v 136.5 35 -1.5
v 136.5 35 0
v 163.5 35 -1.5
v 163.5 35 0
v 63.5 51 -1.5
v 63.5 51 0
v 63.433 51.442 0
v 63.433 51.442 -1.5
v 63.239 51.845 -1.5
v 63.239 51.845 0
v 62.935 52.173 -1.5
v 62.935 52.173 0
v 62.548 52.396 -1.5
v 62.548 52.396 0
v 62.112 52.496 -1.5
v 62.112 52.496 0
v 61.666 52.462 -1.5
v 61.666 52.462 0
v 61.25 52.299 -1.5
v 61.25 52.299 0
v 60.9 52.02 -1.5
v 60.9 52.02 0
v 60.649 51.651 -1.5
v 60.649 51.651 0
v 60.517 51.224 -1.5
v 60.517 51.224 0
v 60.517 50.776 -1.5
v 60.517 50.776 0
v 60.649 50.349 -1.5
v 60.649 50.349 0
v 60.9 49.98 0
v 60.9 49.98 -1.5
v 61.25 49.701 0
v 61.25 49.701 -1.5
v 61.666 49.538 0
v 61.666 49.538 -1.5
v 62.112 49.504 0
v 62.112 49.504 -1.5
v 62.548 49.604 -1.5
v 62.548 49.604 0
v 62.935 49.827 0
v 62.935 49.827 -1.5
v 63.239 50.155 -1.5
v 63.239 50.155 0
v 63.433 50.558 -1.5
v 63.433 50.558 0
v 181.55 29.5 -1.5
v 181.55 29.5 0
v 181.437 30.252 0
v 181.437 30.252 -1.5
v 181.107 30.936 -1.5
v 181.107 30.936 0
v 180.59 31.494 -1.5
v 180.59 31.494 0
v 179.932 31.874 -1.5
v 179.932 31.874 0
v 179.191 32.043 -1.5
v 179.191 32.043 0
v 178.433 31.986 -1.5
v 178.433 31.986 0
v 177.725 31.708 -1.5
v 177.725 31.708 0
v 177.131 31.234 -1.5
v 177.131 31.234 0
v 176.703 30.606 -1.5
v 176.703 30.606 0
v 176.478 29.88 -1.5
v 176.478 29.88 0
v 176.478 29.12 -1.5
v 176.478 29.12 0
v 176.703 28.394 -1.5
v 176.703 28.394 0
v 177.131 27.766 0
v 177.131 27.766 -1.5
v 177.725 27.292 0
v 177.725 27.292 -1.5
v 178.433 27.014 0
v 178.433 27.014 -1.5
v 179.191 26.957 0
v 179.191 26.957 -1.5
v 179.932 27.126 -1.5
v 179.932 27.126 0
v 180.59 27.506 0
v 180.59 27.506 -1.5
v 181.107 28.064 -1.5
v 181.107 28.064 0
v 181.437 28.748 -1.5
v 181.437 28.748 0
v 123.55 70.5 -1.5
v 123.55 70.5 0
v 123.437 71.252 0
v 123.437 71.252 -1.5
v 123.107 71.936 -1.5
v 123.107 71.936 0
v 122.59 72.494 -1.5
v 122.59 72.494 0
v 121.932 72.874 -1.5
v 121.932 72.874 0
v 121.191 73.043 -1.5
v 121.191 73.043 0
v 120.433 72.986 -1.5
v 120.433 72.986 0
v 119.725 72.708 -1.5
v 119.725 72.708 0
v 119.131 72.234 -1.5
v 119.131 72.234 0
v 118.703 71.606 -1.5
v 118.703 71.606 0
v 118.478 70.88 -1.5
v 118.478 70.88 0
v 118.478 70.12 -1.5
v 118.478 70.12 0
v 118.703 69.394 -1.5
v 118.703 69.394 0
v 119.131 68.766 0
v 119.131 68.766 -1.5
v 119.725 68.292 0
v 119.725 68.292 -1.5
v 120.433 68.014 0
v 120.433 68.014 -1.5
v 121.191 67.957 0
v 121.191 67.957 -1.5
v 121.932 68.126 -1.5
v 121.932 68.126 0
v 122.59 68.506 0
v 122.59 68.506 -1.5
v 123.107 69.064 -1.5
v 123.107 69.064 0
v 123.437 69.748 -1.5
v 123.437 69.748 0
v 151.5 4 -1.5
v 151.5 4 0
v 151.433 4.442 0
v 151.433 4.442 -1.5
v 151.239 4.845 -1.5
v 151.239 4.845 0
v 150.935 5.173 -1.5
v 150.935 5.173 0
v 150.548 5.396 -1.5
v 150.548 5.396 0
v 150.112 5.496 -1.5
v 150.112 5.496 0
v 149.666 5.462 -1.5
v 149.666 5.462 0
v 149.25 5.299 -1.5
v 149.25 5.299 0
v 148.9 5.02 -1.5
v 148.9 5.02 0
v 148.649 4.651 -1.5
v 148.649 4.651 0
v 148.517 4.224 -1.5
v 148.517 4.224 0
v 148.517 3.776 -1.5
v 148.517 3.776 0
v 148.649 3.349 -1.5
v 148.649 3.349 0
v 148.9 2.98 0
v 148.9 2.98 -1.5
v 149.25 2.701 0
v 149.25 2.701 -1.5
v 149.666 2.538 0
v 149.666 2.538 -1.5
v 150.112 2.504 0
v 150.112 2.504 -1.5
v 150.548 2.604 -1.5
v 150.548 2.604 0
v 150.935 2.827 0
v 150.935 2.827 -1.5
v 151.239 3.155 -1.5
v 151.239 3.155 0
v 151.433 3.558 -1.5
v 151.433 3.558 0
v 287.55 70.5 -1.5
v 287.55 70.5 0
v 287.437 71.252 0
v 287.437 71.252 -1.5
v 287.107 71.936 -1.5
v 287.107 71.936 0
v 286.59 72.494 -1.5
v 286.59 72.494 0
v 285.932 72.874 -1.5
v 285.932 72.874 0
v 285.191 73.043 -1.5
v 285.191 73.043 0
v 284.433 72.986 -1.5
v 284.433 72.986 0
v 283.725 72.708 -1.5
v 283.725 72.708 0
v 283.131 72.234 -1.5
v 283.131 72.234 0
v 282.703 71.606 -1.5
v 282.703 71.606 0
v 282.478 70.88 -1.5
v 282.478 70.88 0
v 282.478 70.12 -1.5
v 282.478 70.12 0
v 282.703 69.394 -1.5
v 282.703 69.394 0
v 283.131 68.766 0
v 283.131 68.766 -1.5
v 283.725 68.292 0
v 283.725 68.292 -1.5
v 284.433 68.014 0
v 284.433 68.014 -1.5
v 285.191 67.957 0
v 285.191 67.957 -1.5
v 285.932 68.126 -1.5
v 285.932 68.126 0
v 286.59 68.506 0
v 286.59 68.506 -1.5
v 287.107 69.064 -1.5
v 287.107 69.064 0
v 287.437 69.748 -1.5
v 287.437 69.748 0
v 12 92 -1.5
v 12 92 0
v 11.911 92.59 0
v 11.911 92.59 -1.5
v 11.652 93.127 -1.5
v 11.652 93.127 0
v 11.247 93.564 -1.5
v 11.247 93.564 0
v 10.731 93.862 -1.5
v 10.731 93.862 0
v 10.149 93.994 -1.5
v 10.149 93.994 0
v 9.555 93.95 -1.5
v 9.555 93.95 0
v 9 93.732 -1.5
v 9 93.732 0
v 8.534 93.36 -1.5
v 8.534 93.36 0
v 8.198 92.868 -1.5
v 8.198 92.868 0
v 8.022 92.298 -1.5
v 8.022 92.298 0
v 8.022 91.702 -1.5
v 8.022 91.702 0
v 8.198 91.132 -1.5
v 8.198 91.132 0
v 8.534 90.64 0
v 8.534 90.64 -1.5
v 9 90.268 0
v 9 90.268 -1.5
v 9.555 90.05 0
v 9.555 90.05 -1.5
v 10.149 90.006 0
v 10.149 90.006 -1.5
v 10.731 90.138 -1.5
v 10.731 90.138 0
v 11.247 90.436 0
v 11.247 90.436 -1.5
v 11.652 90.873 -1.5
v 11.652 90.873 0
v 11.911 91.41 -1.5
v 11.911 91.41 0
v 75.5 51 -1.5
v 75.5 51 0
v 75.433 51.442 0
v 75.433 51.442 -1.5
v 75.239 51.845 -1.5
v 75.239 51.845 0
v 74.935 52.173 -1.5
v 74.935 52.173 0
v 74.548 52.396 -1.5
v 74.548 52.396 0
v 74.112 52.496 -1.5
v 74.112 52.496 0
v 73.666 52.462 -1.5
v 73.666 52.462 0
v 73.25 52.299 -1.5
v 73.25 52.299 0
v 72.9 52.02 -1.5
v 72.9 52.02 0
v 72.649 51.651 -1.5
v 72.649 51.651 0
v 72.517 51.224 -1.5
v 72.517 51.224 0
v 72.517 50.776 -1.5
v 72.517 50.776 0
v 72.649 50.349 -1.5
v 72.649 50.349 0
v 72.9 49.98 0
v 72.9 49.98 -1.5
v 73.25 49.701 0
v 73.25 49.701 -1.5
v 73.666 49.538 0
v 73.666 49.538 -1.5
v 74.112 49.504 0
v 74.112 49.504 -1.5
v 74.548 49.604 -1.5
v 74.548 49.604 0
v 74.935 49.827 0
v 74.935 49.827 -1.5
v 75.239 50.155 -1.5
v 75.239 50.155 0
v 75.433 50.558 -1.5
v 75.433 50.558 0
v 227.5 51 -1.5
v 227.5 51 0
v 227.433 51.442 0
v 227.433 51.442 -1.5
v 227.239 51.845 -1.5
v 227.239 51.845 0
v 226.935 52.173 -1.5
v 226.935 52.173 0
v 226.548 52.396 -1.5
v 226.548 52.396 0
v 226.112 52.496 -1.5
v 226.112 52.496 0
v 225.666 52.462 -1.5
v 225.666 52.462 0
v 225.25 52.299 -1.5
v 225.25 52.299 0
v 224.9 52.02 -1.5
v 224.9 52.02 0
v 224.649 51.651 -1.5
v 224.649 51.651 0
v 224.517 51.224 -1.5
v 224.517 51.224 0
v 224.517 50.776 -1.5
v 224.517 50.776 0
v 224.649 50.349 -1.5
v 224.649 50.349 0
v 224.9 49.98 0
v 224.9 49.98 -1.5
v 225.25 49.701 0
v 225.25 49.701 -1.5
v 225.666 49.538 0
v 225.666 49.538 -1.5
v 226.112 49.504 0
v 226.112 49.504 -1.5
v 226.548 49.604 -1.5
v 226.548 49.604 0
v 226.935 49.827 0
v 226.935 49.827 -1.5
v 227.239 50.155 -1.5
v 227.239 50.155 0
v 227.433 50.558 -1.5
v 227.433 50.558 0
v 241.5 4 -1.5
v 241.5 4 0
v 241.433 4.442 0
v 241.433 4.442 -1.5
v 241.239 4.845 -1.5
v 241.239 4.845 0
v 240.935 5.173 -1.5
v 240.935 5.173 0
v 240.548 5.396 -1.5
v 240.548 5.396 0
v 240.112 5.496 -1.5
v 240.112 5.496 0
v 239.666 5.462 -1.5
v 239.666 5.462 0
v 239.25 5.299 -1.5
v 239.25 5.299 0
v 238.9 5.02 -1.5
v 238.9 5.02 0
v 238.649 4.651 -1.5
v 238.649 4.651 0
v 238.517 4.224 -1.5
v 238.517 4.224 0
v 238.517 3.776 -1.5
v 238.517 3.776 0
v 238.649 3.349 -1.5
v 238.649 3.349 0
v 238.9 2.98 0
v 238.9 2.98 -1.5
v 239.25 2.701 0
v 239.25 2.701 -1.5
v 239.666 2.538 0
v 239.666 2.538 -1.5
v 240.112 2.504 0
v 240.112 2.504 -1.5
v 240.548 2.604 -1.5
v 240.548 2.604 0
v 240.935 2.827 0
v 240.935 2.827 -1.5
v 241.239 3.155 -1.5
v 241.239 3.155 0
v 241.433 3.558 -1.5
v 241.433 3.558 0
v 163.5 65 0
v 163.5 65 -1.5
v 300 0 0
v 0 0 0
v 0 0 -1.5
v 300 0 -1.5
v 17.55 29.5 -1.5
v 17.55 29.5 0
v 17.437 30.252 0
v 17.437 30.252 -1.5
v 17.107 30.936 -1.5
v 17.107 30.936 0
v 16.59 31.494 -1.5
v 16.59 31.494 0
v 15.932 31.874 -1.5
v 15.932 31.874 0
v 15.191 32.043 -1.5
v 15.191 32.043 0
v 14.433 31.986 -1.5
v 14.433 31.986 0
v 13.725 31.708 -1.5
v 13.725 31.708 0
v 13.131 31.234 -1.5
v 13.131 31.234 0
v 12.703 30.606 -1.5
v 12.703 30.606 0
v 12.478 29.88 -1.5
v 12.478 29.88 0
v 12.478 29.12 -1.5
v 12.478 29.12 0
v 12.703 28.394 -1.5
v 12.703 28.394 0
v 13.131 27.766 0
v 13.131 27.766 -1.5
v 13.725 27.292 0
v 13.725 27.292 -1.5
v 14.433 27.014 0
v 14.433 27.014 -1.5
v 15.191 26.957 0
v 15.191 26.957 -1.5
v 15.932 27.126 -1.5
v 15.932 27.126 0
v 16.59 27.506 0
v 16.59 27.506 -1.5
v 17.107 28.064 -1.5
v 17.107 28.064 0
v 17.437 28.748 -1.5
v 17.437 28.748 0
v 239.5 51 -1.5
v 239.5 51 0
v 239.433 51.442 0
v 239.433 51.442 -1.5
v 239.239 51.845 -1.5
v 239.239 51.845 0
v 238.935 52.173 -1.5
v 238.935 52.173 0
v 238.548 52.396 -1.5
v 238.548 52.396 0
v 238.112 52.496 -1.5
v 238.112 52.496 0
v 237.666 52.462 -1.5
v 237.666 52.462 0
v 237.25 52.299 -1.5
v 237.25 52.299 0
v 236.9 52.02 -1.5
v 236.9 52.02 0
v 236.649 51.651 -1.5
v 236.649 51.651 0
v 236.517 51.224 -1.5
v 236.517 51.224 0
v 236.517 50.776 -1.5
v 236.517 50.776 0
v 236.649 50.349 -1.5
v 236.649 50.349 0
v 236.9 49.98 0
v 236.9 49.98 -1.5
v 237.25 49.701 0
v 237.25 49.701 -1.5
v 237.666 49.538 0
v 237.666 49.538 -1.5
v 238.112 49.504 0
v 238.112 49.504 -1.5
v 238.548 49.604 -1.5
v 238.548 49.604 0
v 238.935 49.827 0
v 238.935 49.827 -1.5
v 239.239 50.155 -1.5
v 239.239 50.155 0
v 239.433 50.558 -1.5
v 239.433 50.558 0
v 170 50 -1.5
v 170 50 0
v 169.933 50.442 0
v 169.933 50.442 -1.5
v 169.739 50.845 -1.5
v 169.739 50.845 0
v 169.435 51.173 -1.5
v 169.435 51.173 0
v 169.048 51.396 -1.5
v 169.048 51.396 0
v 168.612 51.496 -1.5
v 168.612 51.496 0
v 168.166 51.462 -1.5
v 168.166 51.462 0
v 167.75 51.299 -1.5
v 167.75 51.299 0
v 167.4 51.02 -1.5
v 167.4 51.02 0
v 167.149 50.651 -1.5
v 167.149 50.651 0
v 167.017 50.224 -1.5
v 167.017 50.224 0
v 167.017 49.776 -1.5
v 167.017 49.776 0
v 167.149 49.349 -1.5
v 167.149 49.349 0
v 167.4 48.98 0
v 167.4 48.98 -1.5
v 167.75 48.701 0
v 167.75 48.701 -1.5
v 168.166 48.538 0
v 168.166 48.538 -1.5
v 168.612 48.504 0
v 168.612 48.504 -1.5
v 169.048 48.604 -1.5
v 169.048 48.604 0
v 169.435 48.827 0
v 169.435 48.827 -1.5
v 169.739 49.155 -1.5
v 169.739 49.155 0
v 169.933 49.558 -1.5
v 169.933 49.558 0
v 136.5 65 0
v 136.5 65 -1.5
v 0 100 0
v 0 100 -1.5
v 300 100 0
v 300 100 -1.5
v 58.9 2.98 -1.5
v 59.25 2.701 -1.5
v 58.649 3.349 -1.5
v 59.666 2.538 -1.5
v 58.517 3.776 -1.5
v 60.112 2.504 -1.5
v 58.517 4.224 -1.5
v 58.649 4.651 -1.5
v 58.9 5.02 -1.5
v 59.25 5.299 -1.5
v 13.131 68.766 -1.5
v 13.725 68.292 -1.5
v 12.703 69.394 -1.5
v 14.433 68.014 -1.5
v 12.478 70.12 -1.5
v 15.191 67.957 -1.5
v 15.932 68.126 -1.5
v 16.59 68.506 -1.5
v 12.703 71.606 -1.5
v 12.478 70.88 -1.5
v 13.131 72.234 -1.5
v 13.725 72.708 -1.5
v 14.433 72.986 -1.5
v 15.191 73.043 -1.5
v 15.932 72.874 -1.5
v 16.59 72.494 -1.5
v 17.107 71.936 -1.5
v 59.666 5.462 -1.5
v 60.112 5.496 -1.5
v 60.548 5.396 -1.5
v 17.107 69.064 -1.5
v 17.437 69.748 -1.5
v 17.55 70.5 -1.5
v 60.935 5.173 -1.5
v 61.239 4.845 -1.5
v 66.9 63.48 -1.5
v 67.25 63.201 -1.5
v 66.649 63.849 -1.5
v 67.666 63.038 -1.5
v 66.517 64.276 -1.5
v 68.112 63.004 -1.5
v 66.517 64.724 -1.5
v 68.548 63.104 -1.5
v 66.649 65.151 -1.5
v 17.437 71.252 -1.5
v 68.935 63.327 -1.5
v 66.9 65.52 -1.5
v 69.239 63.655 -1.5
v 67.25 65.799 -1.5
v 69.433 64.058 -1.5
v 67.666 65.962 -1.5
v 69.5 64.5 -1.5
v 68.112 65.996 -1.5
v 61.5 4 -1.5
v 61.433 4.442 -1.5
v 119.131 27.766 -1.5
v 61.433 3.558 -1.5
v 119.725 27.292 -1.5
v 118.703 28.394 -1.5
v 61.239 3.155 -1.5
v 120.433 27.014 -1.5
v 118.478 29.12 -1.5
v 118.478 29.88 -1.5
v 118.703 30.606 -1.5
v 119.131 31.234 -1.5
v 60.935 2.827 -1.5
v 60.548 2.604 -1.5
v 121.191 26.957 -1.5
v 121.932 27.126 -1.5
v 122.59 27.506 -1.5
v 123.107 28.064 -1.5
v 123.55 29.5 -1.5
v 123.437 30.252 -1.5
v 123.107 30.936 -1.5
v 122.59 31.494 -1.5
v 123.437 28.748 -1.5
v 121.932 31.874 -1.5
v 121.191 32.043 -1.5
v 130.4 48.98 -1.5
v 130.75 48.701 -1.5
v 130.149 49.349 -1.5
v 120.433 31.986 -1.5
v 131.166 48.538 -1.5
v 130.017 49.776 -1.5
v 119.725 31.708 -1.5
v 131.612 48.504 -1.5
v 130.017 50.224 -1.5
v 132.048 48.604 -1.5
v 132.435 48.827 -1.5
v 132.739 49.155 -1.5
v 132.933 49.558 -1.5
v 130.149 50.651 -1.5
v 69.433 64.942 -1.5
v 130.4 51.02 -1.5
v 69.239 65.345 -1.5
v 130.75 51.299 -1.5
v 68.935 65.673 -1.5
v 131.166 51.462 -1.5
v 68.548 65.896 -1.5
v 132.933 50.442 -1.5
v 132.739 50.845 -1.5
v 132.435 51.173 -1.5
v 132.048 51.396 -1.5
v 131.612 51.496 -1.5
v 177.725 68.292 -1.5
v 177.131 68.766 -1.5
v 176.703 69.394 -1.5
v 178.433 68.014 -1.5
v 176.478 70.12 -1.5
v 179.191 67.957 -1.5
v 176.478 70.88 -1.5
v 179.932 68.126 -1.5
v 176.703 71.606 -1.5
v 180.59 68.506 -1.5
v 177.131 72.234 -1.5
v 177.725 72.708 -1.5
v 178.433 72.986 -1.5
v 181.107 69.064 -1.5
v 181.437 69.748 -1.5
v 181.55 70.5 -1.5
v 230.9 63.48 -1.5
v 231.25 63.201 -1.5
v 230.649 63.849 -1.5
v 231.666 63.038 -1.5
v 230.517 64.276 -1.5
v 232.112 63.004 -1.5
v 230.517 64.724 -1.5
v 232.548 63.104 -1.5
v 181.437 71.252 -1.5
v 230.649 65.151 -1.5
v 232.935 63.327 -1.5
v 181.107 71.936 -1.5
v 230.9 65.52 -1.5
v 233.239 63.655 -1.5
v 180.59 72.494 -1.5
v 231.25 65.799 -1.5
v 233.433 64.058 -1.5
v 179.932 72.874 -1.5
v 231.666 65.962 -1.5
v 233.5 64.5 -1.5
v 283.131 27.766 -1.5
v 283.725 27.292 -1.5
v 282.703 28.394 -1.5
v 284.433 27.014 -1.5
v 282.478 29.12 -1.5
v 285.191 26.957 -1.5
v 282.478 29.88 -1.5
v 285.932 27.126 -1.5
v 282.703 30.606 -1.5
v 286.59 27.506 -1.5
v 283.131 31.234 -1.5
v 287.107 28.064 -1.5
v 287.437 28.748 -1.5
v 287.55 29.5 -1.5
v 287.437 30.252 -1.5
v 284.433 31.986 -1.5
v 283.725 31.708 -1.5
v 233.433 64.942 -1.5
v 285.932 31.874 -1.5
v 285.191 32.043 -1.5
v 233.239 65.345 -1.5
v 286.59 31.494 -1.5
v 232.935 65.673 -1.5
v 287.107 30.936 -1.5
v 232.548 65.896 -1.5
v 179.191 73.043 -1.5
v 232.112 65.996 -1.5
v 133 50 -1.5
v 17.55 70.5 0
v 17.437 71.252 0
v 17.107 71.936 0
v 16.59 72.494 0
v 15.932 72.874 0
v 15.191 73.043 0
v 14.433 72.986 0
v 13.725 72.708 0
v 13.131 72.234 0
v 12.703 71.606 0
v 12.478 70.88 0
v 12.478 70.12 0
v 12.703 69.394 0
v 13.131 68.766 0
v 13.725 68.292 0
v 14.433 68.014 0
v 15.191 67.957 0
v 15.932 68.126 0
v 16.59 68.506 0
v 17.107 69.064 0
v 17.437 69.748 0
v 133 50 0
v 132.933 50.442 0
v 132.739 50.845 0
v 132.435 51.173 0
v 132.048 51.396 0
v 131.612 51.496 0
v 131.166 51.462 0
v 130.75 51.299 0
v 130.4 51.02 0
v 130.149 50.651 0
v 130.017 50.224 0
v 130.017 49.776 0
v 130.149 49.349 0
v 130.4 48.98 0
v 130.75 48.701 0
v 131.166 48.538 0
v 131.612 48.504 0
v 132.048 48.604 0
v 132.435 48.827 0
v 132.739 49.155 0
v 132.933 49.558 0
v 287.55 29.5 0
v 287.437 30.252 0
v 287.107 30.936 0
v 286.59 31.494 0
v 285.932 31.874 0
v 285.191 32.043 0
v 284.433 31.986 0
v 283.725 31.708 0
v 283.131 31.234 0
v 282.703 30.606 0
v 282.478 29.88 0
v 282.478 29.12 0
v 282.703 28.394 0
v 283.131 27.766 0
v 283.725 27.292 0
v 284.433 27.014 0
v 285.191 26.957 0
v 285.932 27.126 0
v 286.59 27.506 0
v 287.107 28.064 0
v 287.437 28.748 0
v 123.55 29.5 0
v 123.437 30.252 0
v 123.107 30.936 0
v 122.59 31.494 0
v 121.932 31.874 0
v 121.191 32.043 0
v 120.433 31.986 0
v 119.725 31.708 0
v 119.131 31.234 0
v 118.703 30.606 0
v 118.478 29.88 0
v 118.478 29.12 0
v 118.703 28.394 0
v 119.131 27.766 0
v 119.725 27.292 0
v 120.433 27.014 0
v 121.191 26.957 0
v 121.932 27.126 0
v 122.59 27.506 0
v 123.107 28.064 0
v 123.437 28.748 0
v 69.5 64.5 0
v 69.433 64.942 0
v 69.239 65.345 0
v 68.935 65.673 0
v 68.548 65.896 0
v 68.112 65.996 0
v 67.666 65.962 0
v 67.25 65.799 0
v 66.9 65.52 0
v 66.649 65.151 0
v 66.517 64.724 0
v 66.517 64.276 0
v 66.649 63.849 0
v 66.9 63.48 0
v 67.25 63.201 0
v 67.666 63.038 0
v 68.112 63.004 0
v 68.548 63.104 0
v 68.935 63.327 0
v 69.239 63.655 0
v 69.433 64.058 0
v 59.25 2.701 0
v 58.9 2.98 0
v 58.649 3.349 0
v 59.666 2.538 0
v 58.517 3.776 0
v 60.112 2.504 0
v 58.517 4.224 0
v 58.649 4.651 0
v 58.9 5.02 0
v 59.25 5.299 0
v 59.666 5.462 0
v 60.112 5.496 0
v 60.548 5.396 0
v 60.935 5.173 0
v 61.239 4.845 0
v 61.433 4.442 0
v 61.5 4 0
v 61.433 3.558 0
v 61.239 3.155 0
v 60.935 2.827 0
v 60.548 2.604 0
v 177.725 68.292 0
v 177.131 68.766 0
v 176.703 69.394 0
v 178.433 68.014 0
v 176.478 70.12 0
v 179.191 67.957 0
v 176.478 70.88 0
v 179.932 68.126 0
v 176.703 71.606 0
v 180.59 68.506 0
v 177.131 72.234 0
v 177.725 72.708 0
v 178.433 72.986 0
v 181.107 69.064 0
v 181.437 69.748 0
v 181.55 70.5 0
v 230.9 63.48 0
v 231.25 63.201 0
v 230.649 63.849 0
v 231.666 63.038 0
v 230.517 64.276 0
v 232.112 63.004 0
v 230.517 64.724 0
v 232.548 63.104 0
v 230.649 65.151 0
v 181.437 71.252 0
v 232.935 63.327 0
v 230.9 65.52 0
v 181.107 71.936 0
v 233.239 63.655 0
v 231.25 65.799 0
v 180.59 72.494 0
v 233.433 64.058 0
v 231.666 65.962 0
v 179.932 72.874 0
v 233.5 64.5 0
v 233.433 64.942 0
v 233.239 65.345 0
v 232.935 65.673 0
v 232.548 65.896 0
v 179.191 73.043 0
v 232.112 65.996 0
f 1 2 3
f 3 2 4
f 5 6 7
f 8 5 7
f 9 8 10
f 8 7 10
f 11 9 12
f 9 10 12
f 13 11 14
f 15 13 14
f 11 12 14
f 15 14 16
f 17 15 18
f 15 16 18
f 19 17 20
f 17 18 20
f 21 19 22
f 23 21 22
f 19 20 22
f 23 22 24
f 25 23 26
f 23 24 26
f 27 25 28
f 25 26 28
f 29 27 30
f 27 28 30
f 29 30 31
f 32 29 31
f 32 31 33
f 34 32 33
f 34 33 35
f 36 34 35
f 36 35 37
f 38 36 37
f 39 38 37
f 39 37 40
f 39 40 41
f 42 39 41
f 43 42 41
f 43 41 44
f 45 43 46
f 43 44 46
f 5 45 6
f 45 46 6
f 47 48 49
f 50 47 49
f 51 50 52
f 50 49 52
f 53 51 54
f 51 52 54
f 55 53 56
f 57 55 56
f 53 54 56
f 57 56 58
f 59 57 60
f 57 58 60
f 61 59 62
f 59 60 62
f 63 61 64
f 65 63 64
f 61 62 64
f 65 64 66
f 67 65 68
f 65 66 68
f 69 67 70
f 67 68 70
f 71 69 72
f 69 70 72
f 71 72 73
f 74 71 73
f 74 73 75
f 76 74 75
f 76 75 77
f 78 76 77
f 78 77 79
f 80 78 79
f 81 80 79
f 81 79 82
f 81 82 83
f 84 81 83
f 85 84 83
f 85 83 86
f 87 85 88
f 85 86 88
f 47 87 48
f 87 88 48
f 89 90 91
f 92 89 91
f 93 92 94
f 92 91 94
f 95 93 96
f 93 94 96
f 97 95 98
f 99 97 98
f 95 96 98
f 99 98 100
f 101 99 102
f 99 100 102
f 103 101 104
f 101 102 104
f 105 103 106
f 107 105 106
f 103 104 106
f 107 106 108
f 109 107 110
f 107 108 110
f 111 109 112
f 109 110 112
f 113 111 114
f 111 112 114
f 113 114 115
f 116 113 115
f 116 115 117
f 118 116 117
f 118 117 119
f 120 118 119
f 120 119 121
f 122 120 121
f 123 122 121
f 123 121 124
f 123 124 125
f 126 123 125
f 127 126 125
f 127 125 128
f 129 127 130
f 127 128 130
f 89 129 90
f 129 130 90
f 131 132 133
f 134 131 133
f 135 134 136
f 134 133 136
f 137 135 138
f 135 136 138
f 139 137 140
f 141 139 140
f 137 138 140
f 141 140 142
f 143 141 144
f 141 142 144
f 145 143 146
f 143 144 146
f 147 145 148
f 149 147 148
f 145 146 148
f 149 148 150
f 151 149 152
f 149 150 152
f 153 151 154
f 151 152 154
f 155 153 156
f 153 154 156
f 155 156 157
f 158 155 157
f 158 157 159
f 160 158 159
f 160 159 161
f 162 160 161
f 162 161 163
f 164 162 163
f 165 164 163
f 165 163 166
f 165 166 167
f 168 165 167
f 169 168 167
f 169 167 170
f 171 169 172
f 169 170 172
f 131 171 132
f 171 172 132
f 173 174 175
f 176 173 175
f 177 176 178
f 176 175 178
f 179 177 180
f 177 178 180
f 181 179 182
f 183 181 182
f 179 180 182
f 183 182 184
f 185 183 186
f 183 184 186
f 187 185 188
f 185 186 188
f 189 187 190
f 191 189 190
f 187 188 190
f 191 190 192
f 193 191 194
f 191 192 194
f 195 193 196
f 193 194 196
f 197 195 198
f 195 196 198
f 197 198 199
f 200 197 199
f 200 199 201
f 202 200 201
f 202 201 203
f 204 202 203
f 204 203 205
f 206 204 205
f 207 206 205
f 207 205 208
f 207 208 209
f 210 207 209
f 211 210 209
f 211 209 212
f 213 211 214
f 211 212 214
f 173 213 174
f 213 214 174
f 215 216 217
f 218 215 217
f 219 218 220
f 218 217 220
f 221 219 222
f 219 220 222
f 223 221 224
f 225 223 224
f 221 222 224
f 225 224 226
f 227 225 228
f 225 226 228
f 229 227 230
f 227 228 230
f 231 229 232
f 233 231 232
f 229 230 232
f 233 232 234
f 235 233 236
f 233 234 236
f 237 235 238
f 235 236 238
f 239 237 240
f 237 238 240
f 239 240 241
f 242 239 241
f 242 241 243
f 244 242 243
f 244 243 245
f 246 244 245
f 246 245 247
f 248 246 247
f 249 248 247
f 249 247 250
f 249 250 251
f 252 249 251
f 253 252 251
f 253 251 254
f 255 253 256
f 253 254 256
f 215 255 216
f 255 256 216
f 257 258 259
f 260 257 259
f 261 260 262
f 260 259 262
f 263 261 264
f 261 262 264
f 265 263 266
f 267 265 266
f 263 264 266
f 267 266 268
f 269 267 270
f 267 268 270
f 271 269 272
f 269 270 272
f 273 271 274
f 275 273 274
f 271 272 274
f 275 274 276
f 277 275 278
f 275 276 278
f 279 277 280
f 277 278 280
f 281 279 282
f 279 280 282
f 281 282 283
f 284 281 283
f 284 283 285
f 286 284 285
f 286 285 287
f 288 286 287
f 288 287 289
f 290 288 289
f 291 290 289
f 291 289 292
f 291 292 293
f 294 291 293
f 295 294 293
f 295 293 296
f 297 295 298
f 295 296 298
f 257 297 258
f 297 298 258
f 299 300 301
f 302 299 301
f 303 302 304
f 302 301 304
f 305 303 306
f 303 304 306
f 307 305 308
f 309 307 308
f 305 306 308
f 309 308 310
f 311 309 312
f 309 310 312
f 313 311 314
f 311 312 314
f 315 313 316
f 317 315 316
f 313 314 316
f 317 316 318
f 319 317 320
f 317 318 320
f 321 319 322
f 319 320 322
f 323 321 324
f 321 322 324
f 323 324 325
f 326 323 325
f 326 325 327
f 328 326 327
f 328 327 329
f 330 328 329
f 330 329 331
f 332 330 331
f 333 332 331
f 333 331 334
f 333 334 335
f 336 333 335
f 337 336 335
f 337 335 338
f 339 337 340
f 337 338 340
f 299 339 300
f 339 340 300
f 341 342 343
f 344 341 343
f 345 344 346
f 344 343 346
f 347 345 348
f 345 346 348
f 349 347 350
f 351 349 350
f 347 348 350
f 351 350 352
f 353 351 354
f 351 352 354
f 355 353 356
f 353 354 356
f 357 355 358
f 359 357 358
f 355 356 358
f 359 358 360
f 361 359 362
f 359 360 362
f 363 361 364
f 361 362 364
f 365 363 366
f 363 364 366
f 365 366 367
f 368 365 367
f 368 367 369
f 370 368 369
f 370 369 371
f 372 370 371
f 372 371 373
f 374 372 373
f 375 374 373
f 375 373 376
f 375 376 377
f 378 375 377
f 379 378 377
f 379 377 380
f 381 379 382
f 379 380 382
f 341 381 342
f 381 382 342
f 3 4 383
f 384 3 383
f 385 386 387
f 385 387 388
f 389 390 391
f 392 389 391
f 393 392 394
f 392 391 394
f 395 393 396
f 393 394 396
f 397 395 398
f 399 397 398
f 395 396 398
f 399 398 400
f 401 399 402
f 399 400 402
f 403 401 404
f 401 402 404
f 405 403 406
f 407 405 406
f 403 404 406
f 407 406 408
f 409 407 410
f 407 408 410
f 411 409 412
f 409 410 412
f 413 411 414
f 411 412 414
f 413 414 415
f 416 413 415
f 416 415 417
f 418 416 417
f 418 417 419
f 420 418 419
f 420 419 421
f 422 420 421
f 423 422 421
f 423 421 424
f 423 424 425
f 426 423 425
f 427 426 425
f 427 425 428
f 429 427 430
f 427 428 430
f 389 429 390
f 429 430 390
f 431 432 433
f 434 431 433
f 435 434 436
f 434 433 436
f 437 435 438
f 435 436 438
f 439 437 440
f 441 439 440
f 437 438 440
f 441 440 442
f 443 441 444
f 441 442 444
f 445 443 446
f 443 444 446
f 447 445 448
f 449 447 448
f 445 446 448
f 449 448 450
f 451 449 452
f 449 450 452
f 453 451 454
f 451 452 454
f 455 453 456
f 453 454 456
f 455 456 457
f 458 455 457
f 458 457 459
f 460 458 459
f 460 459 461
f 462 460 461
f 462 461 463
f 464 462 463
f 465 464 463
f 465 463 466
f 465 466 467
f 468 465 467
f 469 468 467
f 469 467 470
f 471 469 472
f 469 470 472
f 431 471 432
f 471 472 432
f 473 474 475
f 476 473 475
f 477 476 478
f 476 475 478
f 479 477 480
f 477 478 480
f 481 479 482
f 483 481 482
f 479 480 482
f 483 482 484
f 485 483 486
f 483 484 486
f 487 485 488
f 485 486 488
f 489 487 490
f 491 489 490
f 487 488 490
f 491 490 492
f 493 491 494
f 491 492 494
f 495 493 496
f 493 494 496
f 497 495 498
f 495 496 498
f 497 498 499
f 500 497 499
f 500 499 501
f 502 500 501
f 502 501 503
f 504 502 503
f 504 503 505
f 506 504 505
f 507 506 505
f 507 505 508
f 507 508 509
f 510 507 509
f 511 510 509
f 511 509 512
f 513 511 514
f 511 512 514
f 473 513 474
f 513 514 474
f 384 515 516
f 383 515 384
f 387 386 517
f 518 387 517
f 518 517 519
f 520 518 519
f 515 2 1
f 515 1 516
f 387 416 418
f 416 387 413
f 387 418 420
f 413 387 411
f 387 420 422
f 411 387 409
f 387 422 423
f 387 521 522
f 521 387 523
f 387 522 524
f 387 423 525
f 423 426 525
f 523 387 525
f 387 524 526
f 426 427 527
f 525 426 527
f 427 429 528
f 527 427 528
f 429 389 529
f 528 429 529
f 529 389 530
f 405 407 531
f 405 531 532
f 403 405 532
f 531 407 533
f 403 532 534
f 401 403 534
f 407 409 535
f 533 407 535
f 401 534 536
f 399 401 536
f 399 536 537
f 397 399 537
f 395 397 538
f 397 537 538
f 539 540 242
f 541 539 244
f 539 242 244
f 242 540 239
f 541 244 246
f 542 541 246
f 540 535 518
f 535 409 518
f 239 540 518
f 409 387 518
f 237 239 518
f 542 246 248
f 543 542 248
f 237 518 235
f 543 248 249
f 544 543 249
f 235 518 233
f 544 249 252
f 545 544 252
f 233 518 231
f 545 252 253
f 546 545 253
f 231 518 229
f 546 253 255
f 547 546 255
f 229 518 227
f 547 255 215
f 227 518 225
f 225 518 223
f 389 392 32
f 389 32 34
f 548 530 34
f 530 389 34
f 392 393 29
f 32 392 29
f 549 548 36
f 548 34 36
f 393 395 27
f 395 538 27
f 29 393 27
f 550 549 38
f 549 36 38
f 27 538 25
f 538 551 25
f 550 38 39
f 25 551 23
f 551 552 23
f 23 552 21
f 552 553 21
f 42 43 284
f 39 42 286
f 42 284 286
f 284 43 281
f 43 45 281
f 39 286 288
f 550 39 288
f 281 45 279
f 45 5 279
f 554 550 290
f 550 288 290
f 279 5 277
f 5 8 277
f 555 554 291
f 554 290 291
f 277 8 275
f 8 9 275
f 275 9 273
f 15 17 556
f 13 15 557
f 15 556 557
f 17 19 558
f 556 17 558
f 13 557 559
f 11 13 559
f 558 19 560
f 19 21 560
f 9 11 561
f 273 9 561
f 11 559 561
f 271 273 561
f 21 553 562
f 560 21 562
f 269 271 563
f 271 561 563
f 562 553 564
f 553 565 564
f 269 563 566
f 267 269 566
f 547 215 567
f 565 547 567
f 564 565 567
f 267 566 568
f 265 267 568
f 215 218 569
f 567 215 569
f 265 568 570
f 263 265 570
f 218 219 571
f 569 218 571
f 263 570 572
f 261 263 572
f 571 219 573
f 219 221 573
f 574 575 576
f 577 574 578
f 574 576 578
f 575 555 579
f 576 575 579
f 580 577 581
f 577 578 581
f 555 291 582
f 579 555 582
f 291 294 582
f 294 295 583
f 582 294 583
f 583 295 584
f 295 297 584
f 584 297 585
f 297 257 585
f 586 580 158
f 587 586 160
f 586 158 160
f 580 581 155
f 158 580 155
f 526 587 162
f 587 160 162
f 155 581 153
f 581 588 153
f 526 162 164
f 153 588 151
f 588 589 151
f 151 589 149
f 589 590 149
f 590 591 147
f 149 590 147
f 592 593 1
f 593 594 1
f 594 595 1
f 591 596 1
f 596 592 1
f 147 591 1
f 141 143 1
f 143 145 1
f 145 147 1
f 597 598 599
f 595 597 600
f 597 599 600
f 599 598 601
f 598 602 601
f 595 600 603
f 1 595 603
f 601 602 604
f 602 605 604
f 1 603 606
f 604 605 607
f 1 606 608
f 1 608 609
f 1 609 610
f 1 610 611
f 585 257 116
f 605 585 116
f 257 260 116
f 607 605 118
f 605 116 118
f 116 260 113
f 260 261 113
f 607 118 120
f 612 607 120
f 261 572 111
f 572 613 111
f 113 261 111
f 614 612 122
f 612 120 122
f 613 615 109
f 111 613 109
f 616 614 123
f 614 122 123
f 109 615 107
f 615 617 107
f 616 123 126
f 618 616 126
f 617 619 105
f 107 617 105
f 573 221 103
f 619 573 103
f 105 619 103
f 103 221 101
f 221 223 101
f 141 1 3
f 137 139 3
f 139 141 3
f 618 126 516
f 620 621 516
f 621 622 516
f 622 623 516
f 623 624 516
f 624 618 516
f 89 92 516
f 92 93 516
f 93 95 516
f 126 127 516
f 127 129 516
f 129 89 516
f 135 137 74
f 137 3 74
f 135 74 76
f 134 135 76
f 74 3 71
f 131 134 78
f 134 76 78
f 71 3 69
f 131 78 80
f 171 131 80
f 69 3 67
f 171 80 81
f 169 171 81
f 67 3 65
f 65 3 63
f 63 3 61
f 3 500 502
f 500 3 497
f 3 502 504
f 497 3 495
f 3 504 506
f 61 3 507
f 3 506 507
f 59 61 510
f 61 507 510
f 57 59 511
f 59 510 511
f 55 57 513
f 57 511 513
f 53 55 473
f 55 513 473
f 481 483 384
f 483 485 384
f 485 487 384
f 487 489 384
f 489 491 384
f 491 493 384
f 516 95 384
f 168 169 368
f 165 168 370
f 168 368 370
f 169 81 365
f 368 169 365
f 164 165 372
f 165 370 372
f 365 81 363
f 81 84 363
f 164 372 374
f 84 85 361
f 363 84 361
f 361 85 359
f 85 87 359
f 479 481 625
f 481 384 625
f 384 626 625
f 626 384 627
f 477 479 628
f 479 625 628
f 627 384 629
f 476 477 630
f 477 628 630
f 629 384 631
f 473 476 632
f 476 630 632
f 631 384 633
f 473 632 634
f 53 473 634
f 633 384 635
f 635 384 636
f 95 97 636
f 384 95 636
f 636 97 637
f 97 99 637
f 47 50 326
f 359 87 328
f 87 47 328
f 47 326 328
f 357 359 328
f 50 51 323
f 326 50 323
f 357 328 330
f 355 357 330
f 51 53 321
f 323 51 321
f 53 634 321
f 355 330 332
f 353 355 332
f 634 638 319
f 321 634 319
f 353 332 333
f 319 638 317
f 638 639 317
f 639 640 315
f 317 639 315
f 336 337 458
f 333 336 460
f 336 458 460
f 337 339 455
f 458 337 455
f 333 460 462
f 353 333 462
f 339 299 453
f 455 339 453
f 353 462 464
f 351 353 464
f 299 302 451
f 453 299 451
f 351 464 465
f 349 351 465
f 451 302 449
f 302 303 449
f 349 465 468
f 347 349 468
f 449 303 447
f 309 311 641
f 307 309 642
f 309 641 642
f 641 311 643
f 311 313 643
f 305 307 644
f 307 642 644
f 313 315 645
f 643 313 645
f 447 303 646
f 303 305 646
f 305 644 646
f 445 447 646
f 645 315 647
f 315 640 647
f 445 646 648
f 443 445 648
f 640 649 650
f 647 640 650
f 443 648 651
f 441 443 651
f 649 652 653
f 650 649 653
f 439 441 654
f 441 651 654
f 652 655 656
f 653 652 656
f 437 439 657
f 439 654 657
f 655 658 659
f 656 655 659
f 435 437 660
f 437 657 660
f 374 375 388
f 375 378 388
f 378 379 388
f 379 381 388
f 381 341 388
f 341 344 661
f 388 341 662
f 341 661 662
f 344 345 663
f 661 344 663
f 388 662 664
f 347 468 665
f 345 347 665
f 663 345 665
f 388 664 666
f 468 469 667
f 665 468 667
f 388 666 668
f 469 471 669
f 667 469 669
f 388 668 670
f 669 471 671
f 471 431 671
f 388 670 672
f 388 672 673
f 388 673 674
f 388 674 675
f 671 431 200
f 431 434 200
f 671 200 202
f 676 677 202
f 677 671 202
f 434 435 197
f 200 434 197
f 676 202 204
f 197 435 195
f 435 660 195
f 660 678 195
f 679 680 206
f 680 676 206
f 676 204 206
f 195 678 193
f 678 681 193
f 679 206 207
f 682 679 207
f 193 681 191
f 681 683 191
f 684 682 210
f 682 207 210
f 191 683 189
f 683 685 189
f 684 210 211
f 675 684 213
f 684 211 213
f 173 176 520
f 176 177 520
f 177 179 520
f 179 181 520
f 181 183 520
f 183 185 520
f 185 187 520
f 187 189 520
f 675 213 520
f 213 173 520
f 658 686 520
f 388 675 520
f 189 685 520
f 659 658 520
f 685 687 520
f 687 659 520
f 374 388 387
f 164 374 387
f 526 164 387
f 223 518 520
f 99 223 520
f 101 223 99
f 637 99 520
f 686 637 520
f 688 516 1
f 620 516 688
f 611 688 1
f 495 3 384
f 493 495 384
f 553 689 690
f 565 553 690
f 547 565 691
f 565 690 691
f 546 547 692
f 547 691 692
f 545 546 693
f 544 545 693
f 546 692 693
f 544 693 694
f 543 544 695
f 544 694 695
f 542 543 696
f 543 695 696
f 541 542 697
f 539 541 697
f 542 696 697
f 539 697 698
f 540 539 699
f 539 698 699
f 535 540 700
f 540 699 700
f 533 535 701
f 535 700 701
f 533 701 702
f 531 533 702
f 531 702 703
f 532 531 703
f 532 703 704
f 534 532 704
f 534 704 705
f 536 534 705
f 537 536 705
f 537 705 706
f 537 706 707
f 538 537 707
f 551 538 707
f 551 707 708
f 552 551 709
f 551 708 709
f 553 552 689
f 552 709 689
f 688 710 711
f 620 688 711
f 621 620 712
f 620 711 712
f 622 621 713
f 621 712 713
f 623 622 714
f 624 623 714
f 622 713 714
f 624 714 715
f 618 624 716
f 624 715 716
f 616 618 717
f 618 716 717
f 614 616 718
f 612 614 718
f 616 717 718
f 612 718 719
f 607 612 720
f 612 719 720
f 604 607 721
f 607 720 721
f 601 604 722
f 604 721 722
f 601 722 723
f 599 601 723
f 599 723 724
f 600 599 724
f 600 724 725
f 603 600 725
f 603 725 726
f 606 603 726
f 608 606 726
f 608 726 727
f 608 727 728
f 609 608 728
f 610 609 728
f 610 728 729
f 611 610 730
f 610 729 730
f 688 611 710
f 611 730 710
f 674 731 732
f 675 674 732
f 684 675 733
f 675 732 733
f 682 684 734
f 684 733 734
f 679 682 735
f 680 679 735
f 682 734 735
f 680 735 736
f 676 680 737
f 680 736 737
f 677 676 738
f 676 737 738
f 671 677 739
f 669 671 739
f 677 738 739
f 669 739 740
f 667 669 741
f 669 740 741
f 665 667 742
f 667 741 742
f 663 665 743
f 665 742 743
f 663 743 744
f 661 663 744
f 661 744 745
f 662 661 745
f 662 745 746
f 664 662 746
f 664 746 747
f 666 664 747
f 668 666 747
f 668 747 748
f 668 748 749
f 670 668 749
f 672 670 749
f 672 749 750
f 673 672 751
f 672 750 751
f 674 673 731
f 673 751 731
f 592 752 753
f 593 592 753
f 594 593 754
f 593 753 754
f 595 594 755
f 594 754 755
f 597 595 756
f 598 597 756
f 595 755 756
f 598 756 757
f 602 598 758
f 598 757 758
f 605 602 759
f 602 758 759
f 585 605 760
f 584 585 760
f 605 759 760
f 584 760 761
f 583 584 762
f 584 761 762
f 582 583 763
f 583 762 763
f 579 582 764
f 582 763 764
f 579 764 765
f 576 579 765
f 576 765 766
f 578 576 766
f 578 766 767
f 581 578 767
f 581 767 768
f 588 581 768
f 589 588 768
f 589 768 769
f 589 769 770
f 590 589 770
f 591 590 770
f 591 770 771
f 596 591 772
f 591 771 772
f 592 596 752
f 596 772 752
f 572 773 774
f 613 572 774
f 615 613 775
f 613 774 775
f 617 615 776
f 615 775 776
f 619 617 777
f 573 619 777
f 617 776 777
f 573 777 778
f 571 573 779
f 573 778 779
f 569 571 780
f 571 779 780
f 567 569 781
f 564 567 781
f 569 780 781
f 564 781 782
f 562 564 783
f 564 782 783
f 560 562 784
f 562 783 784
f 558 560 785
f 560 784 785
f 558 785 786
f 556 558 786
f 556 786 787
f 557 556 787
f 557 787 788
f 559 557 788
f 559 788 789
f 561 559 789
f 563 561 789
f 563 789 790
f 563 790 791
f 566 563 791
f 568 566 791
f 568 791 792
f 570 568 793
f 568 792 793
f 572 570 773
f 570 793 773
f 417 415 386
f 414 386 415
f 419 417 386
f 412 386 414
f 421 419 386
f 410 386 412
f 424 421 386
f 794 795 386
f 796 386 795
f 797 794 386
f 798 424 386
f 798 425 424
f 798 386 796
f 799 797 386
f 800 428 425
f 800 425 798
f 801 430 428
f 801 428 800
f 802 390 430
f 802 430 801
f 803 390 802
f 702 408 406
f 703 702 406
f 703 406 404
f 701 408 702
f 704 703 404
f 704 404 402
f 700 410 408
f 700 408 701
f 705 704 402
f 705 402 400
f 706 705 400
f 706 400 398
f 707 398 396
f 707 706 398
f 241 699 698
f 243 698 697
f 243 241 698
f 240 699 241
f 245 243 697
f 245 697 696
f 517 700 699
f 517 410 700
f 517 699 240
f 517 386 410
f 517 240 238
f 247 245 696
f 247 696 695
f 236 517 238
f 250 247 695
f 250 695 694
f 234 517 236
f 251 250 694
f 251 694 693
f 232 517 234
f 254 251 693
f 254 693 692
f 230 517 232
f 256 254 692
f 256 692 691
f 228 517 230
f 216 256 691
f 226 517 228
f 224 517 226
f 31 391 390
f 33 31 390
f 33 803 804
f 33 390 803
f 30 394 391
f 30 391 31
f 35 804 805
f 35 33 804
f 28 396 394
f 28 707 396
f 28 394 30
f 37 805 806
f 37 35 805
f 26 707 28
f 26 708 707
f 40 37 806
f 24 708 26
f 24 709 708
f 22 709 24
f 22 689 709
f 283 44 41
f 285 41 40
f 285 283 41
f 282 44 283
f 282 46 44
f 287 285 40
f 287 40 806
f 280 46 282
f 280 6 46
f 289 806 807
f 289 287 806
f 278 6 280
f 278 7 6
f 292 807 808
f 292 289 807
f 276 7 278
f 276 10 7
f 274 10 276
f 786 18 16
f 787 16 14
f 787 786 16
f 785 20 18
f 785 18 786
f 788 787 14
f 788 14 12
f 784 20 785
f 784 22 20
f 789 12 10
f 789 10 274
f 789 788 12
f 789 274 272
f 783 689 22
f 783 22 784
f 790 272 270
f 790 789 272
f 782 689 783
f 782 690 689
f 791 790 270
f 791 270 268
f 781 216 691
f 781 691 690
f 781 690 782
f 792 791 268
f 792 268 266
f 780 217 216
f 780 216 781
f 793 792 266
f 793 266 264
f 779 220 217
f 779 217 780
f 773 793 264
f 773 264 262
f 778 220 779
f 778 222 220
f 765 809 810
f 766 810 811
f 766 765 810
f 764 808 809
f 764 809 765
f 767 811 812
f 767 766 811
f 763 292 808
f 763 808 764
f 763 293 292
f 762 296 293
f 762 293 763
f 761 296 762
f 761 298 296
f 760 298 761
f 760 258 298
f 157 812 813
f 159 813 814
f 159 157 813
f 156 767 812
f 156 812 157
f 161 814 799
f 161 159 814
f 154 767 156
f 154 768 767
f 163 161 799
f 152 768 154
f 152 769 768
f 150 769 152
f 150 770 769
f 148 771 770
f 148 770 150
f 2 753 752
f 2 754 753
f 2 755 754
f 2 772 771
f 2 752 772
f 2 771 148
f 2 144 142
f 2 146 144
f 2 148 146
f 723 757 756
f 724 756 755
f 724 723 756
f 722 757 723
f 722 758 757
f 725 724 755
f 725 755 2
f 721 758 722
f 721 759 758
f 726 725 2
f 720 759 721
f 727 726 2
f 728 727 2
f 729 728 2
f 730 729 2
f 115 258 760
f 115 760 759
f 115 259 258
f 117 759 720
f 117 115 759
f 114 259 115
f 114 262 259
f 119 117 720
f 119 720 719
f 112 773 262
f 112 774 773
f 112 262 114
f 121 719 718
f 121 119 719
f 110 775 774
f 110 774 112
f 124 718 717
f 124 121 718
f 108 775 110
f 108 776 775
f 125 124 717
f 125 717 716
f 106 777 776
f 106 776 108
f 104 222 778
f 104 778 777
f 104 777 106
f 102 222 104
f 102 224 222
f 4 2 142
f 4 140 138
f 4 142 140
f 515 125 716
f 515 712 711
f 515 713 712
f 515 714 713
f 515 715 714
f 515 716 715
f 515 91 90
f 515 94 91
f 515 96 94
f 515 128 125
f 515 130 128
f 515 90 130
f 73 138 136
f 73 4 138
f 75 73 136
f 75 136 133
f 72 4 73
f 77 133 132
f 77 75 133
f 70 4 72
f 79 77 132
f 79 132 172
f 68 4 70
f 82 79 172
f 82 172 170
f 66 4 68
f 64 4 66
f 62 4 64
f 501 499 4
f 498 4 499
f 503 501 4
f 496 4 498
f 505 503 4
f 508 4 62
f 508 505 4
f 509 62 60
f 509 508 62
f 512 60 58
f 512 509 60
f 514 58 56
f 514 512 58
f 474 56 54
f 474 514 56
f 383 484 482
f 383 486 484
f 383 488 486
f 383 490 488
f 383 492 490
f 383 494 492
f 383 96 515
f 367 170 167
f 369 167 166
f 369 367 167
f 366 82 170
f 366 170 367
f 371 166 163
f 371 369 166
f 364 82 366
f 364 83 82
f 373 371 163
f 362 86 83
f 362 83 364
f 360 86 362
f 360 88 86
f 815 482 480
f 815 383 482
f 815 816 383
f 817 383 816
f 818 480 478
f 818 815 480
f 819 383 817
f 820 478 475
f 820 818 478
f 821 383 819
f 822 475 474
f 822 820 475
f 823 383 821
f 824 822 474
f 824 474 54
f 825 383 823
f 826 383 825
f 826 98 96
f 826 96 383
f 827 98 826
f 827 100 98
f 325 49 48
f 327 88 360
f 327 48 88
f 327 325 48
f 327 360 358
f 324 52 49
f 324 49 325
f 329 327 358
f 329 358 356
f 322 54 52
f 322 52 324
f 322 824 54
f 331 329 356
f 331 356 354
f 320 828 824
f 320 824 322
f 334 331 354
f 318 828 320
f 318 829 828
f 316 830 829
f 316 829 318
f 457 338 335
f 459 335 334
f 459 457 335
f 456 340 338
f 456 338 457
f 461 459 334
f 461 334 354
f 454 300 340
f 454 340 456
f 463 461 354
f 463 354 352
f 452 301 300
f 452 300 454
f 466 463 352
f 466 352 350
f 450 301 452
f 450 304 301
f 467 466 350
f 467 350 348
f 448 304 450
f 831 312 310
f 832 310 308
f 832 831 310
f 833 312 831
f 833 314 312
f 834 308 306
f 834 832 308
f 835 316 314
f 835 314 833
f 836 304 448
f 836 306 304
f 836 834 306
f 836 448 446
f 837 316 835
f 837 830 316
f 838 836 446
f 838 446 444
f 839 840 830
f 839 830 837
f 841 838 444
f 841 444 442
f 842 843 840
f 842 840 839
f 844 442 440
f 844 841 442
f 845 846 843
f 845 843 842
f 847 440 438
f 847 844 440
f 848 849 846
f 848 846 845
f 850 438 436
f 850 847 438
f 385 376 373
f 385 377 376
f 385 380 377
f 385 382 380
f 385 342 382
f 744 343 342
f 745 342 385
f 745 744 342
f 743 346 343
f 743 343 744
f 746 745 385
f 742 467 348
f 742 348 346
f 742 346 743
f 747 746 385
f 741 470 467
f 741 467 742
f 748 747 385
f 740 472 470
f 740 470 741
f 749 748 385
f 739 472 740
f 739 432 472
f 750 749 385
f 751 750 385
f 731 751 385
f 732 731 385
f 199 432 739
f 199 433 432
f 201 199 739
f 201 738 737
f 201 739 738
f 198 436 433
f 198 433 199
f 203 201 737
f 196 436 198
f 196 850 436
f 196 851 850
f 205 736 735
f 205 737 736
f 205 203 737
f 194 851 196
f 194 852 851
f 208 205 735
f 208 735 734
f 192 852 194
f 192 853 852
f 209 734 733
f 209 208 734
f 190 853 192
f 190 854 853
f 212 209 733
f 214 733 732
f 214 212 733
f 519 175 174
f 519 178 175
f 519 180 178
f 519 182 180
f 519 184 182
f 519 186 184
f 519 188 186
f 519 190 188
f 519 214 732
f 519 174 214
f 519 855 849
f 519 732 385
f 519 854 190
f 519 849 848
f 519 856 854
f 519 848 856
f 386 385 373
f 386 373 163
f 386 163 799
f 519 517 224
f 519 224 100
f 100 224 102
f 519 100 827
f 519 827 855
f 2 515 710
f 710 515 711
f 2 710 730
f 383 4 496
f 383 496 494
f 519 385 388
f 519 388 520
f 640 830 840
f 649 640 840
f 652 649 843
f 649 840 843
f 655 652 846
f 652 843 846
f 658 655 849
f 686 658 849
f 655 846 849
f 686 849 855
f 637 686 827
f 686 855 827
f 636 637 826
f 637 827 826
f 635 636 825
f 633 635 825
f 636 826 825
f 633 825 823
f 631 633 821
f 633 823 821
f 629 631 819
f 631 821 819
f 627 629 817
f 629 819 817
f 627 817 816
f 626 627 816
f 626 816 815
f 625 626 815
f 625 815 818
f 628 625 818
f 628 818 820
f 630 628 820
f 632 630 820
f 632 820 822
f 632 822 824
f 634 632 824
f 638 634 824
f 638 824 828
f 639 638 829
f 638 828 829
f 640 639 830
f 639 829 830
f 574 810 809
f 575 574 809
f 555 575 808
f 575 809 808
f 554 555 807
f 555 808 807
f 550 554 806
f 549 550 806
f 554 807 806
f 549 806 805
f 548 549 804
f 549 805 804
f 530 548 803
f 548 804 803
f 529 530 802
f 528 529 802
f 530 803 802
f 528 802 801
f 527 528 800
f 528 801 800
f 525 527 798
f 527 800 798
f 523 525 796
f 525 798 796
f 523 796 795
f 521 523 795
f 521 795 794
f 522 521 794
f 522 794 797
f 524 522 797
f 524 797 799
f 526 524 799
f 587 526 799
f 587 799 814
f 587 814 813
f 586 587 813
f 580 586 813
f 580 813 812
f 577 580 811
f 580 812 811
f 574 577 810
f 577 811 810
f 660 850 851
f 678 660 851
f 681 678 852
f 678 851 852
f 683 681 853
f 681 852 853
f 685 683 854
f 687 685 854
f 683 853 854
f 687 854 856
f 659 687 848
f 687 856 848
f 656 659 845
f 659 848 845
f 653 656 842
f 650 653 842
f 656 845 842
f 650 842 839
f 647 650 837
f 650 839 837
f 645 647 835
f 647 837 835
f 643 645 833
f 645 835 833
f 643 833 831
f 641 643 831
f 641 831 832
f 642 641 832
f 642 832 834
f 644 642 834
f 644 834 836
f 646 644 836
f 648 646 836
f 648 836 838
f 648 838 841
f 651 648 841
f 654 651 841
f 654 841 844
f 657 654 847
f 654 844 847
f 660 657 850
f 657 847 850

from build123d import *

# Parameters (mm, degrees)
F0_W     = 300
F0_H     = 100
F0_R     = 1.5
F0_R_2   = 2.55
F0_R_3   = 2
F0_W_2   = 27
F0_H_2   = 30
F1_DEPTH = 1.5


with BuildPart() as f1:
    # F0 (on Top) → F1 (new body)
    with BuildSketch(Plane.XY):
        with Locations((150, 50)):
            Rectangle(F0_W, F0_H)
        with Locations((60, 4)):
            Circle(F0_R, mode=Mode.SUBTRACT)
        with Locations((15, 29.5)):
            Circle(F0_R_2, mode=Mode.SUBTRACT)
        with Locations((121, 29.5)):
            Circle(F0_R_2, mode=Mode.SUBTRACT)
        with Locations((150, 4)):
            Circle(F0_R, mode=Mode.SUBTRACT)
        with Locations((240, 4)):
            Circle(F0_R, mode=Mode.SUBTRACT)
        with Locations((179, 29.5)):
            Circle(F0_R_2, mode=Mode.SUBTRACT)
        with Locations((285, 29.5)):
            Circle(F0_R_2, mode=Mode.SUBTRACT)
        with Locations((62, 51)):
            Circle(F0_R, mode=Mode.SUBTRACT)
        with Locations((74, 51)):
            Circle(F0_R, mode=Mode.SUBTRACT)
        with Locations((15, 70.5)):
            Circle(F0_R_2, mode=Mode.SUBTRACT)
        with Locations((68, 64.5)):
            Circle(F0_R, mode=Mode.SUBTRACT)
        with Locations((131.5, 50)):
            Circle(F0_R, mode=Mode.SUBTRACT)
        with Locations((121, 70.5)):
            Circle(F0_R_2, mode=Mode.SUBTRACT)
        with Locations((10, 92)):
            Circle(F0_R_3, mode=Mode.SUBTRACT)
        with Locations((150, 50)):
            Rectangle(F0_W_2, F0_H_2, mode=Mode.SUBTRACT)
        with Locations((168.5, 50)):
            Circle(F0_R, mode=Mode.SUBTRACT)
        with Locations((179, 70.5)):
            Circle(F0_R_2, mode=Mode.SUBTRACT)
        with Locations((226, 51)):
            Circle(F0_R, mode=Mode.SUBTRACT)
        with Locations((238, 51)):
            Circle(F0_R, mode=Mode.SUBTRACT)
        with Locations((232, 64.5)):
            Circle(F0_R, mode=Mode.SUBTRACT)
        with Locations((285, 70.5)):
            Circle(F0_R_2, mode=Mode.SUBTRACT)
    extrude(amount=-F1_DEPTH)


solid = f1.part
